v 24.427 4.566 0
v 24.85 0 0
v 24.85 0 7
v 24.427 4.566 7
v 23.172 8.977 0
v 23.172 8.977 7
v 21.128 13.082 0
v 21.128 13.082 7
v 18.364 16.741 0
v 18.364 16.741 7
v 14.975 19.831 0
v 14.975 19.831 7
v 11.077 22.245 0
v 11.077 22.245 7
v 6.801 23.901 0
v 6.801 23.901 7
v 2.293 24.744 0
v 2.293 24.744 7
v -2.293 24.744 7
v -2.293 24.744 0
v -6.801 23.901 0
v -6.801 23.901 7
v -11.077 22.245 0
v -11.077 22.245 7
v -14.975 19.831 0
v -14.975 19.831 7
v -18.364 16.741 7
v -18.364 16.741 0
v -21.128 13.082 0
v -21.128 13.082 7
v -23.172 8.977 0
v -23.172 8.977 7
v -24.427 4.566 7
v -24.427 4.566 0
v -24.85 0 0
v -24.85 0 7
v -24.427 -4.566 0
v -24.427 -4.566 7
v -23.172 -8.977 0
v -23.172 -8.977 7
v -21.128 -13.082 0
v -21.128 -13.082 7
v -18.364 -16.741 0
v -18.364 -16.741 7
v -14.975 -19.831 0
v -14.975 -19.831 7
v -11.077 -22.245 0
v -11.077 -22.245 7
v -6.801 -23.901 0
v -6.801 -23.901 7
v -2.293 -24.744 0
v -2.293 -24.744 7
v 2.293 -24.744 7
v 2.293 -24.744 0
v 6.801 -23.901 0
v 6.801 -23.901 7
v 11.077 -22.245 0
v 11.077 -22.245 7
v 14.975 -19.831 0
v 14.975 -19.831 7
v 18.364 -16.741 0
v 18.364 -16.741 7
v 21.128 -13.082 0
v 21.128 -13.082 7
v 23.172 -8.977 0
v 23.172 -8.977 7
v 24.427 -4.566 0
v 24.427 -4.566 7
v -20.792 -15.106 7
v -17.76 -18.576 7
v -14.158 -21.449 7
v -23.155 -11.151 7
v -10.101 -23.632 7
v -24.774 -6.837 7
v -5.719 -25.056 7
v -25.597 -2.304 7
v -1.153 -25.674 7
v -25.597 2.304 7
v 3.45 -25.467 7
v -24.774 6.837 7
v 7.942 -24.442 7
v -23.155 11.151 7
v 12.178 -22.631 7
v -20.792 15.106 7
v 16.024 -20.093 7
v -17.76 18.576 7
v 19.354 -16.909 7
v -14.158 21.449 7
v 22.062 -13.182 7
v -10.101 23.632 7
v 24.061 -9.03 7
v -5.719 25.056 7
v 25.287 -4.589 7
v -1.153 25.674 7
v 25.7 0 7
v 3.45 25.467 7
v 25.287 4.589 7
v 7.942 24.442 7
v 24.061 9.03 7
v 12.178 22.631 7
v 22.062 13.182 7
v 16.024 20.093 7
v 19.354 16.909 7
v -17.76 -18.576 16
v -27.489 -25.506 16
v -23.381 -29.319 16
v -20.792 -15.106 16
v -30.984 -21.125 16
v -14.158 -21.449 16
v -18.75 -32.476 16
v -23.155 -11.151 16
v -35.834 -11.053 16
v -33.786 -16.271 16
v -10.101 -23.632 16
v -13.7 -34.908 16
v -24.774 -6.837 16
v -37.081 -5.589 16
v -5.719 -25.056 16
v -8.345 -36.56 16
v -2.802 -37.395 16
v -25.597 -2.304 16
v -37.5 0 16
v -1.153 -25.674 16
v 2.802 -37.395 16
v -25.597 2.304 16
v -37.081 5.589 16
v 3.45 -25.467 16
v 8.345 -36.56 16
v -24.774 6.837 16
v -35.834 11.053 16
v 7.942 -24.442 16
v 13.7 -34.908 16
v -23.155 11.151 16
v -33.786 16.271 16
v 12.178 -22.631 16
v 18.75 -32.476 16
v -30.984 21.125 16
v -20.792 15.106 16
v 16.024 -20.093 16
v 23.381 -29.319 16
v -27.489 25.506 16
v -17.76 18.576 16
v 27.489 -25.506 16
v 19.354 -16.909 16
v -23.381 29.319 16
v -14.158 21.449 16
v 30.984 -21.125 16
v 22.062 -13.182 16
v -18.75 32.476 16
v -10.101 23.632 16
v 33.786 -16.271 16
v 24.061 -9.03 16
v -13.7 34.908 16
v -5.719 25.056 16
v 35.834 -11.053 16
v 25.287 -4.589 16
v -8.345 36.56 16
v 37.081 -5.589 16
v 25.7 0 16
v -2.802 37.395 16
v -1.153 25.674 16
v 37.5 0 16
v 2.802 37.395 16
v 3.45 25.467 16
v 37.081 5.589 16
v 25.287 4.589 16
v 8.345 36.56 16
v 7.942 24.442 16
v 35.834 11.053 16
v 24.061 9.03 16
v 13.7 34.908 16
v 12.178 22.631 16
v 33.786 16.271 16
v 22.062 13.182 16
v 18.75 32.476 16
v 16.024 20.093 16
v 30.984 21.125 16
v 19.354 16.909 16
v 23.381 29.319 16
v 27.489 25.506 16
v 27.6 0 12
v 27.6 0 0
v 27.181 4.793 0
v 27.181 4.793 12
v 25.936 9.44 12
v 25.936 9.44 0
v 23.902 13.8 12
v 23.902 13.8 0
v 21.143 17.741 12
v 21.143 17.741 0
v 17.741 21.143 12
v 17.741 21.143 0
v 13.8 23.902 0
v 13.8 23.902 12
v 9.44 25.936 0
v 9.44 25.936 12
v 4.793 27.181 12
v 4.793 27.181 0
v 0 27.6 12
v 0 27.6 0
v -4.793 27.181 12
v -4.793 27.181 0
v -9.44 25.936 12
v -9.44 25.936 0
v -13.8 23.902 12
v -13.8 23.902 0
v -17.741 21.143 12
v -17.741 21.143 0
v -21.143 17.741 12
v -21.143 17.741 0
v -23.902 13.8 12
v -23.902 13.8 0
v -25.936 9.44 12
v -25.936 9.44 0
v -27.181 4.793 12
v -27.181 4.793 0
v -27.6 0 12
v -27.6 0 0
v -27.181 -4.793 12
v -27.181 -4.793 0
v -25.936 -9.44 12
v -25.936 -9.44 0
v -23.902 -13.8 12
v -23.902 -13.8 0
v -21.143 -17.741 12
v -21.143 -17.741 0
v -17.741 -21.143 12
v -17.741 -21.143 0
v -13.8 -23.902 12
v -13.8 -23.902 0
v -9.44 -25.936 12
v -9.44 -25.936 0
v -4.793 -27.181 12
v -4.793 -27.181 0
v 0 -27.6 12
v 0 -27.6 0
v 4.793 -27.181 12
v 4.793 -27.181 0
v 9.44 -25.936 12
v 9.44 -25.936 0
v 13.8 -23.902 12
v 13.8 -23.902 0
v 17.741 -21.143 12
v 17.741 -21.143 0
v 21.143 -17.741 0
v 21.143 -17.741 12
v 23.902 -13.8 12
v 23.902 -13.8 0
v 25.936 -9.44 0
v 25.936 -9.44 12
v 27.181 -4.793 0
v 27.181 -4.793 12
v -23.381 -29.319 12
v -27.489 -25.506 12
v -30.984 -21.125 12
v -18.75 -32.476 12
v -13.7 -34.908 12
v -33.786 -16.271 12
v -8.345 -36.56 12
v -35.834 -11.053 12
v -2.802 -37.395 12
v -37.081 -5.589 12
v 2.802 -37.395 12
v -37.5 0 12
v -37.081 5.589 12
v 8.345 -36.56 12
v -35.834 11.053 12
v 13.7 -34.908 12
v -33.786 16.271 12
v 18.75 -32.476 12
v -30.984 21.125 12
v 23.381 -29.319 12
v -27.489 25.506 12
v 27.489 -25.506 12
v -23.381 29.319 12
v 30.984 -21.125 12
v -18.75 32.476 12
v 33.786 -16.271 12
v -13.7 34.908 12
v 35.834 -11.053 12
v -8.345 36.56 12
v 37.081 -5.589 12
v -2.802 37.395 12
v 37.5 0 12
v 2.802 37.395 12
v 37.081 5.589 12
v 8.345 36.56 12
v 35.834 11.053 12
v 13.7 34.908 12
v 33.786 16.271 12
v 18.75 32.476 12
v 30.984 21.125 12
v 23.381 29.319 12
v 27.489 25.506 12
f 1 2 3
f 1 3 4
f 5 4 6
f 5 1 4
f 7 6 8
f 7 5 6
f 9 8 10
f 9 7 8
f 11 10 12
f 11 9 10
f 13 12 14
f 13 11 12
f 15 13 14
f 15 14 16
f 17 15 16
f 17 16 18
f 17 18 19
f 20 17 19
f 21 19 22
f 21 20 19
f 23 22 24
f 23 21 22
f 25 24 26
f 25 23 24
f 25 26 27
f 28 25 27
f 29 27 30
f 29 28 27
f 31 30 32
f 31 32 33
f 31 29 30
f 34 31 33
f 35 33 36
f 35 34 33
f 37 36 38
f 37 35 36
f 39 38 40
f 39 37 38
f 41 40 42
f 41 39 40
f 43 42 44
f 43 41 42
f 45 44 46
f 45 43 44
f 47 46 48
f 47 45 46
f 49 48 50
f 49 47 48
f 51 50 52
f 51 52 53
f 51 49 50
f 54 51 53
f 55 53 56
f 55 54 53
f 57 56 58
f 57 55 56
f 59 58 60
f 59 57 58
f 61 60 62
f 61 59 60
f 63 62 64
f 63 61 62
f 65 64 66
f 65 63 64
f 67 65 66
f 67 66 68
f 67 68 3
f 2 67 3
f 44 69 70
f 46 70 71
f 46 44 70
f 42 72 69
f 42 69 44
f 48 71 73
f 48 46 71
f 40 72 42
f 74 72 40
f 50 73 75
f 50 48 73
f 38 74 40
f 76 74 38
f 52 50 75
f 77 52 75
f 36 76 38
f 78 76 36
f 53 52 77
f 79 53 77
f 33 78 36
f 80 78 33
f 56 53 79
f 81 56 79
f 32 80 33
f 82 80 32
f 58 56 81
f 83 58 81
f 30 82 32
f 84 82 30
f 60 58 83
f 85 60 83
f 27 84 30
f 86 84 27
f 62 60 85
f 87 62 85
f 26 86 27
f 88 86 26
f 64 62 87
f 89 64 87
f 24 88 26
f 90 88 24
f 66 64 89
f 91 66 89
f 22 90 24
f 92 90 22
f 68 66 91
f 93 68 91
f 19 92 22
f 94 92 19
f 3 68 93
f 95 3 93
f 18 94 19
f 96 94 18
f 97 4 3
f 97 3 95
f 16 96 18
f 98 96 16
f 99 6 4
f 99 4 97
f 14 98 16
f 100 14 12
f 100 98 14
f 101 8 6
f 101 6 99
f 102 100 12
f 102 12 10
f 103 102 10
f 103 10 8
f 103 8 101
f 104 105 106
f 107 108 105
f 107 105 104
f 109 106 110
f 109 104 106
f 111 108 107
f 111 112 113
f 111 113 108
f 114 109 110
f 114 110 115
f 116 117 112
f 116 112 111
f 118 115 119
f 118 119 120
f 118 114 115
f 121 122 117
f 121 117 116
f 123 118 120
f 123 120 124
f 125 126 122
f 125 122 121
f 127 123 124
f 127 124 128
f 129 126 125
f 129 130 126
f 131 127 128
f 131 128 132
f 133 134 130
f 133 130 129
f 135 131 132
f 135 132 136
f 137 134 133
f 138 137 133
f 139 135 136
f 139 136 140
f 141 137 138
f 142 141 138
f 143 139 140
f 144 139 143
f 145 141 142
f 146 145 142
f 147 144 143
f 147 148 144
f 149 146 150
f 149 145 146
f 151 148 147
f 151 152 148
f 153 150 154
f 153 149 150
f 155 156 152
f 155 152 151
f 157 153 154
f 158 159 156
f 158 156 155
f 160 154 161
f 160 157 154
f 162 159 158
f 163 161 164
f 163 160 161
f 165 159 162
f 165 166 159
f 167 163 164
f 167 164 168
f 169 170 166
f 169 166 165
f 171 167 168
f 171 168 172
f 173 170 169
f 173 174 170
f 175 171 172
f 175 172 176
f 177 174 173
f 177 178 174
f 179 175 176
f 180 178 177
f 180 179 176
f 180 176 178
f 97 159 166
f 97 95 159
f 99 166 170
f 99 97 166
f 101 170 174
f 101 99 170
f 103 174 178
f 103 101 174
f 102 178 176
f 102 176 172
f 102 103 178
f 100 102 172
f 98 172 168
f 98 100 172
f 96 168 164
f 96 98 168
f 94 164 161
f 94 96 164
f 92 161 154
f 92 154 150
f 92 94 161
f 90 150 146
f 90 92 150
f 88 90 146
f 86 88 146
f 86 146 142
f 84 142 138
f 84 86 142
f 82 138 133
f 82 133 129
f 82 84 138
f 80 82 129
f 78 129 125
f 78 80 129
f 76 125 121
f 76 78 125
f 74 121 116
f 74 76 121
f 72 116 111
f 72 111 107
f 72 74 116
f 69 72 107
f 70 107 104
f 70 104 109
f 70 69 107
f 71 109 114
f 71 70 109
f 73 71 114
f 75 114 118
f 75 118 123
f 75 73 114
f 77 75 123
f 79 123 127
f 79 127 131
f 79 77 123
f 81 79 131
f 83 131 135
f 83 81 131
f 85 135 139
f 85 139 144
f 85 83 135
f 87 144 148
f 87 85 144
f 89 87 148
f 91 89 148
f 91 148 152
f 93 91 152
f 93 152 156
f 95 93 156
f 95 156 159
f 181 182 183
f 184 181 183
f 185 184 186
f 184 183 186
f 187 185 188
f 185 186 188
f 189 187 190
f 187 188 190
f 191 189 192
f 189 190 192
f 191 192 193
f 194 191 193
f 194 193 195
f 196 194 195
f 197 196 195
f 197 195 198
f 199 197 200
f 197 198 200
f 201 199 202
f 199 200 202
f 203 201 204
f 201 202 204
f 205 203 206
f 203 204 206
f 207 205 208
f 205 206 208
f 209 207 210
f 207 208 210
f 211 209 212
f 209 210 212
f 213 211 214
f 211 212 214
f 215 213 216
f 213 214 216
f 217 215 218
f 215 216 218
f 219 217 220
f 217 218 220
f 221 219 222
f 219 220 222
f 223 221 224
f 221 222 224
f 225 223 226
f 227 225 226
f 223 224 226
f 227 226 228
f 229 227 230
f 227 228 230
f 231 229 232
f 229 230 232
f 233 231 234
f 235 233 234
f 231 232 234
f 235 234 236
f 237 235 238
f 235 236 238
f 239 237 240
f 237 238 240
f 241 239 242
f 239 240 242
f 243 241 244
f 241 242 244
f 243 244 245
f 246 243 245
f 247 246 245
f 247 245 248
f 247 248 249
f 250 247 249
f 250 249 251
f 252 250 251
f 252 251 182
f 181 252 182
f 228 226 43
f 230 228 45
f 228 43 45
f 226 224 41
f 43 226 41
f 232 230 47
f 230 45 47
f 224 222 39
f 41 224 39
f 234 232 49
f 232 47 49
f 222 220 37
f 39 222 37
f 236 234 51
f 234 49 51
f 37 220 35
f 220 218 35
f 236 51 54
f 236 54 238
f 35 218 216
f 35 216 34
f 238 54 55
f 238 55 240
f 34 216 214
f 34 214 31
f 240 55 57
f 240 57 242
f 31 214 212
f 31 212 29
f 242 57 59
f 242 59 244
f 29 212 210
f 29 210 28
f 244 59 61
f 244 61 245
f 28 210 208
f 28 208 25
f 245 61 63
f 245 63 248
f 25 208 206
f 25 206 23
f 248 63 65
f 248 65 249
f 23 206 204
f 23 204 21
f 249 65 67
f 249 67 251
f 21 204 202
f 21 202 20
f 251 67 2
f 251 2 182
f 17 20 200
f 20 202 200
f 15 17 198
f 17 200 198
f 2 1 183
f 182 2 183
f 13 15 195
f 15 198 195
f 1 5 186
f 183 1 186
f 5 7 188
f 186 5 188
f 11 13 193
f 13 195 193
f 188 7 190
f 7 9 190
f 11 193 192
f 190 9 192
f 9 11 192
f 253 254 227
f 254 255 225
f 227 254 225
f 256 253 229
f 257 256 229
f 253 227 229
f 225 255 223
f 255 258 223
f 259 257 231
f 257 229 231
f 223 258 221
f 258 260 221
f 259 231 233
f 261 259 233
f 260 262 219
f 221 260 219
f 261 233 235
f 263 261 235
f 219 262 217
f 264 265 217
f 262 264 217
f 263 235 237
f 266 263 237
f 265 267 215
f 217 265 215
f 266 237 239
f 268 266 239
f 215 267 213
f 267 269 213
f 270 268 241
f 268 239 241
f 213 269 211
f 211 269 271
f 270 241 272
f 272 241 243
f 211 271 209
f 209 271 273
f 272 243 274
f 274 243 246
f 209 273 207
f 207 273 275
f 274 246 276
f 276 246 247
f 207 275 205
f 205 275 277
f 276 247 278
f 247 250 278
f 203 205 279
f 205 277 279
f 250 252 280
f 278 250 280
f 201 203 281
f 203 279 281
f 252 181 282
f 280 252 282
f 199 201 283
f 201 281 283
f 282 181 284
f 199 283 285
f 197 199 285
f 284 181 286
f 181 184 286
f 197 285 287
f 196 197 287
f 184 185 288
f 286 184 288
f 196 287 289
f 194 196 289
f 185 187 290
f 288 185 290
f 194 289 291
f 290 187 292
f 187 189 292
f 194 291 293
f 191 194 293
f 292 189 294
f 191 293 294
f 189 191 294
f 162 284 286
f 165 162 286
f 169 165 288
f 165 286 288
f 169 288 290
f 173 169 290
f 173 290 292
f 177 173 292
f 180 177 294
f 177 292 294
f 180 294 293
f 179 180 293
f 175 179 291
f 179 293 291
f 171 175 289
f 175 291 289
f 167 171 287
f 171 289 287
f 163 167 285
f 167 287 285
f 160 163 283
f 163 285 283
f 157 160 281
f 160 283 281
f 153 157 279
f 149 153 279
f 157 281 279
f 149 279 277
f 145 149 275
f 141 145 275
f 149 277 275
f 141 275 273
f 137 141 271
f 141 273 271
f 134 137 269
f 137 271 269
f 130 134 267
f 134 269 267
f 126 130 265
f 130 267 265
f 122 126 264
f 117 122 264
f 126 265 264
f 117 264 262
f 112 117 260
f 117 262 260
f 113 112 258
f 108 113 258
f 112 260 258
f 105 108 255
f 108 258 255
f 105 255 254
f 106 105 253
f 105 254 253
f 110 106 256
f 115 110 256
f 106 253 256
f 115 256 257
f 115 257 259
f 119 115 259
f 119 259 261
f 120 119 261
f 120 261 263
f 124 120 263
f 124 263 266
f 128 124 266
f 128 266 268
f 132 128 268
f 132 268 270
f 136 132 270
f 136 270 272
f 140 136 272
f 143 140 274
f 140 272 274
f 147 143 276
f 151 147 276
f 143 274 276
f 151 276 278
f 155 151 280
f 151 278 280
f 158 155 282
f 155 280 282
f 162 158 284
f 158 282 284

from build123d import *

# Parameters (mm, degrees)
F0_R     = 25.7
F0_R_2   = 24.85
F1_DEPTH = 7
F2_R     = 27.6
F2_R_2   = 25.7
F3_DEPTH = 12
F5_R     = 37.5
F5_R_2   = 25.7
F6_DEPTH = 4


with BuildPart() as f1:
    # F0 (on Top) → F1 (new body)
    with BuildSketch(Plane.XY):
        Circle(F0_R)
        Circle(F0_R_2, mode=Mode.SUBTRACT)
    extrude(amount=F1_DEPTH)

    # F2 (on Top) → F3 (join)
    with BuildSketch(Plane.XY):
        Circle(F2_R)
        Circle(F2_R_2, mode=Mode.SUBTRACT)
    extrude(amount=F3_DEPTH)

    # F5 (on offset) → F6 (join)
    with BuildSketch(Plane.XY.offset(12)):
        Circle(F5_R)
        Circle(F5_R_2, mode=Mode.SUBTRACT)
    extrude(amount=F6_DEPTH)


solid = f1.part
